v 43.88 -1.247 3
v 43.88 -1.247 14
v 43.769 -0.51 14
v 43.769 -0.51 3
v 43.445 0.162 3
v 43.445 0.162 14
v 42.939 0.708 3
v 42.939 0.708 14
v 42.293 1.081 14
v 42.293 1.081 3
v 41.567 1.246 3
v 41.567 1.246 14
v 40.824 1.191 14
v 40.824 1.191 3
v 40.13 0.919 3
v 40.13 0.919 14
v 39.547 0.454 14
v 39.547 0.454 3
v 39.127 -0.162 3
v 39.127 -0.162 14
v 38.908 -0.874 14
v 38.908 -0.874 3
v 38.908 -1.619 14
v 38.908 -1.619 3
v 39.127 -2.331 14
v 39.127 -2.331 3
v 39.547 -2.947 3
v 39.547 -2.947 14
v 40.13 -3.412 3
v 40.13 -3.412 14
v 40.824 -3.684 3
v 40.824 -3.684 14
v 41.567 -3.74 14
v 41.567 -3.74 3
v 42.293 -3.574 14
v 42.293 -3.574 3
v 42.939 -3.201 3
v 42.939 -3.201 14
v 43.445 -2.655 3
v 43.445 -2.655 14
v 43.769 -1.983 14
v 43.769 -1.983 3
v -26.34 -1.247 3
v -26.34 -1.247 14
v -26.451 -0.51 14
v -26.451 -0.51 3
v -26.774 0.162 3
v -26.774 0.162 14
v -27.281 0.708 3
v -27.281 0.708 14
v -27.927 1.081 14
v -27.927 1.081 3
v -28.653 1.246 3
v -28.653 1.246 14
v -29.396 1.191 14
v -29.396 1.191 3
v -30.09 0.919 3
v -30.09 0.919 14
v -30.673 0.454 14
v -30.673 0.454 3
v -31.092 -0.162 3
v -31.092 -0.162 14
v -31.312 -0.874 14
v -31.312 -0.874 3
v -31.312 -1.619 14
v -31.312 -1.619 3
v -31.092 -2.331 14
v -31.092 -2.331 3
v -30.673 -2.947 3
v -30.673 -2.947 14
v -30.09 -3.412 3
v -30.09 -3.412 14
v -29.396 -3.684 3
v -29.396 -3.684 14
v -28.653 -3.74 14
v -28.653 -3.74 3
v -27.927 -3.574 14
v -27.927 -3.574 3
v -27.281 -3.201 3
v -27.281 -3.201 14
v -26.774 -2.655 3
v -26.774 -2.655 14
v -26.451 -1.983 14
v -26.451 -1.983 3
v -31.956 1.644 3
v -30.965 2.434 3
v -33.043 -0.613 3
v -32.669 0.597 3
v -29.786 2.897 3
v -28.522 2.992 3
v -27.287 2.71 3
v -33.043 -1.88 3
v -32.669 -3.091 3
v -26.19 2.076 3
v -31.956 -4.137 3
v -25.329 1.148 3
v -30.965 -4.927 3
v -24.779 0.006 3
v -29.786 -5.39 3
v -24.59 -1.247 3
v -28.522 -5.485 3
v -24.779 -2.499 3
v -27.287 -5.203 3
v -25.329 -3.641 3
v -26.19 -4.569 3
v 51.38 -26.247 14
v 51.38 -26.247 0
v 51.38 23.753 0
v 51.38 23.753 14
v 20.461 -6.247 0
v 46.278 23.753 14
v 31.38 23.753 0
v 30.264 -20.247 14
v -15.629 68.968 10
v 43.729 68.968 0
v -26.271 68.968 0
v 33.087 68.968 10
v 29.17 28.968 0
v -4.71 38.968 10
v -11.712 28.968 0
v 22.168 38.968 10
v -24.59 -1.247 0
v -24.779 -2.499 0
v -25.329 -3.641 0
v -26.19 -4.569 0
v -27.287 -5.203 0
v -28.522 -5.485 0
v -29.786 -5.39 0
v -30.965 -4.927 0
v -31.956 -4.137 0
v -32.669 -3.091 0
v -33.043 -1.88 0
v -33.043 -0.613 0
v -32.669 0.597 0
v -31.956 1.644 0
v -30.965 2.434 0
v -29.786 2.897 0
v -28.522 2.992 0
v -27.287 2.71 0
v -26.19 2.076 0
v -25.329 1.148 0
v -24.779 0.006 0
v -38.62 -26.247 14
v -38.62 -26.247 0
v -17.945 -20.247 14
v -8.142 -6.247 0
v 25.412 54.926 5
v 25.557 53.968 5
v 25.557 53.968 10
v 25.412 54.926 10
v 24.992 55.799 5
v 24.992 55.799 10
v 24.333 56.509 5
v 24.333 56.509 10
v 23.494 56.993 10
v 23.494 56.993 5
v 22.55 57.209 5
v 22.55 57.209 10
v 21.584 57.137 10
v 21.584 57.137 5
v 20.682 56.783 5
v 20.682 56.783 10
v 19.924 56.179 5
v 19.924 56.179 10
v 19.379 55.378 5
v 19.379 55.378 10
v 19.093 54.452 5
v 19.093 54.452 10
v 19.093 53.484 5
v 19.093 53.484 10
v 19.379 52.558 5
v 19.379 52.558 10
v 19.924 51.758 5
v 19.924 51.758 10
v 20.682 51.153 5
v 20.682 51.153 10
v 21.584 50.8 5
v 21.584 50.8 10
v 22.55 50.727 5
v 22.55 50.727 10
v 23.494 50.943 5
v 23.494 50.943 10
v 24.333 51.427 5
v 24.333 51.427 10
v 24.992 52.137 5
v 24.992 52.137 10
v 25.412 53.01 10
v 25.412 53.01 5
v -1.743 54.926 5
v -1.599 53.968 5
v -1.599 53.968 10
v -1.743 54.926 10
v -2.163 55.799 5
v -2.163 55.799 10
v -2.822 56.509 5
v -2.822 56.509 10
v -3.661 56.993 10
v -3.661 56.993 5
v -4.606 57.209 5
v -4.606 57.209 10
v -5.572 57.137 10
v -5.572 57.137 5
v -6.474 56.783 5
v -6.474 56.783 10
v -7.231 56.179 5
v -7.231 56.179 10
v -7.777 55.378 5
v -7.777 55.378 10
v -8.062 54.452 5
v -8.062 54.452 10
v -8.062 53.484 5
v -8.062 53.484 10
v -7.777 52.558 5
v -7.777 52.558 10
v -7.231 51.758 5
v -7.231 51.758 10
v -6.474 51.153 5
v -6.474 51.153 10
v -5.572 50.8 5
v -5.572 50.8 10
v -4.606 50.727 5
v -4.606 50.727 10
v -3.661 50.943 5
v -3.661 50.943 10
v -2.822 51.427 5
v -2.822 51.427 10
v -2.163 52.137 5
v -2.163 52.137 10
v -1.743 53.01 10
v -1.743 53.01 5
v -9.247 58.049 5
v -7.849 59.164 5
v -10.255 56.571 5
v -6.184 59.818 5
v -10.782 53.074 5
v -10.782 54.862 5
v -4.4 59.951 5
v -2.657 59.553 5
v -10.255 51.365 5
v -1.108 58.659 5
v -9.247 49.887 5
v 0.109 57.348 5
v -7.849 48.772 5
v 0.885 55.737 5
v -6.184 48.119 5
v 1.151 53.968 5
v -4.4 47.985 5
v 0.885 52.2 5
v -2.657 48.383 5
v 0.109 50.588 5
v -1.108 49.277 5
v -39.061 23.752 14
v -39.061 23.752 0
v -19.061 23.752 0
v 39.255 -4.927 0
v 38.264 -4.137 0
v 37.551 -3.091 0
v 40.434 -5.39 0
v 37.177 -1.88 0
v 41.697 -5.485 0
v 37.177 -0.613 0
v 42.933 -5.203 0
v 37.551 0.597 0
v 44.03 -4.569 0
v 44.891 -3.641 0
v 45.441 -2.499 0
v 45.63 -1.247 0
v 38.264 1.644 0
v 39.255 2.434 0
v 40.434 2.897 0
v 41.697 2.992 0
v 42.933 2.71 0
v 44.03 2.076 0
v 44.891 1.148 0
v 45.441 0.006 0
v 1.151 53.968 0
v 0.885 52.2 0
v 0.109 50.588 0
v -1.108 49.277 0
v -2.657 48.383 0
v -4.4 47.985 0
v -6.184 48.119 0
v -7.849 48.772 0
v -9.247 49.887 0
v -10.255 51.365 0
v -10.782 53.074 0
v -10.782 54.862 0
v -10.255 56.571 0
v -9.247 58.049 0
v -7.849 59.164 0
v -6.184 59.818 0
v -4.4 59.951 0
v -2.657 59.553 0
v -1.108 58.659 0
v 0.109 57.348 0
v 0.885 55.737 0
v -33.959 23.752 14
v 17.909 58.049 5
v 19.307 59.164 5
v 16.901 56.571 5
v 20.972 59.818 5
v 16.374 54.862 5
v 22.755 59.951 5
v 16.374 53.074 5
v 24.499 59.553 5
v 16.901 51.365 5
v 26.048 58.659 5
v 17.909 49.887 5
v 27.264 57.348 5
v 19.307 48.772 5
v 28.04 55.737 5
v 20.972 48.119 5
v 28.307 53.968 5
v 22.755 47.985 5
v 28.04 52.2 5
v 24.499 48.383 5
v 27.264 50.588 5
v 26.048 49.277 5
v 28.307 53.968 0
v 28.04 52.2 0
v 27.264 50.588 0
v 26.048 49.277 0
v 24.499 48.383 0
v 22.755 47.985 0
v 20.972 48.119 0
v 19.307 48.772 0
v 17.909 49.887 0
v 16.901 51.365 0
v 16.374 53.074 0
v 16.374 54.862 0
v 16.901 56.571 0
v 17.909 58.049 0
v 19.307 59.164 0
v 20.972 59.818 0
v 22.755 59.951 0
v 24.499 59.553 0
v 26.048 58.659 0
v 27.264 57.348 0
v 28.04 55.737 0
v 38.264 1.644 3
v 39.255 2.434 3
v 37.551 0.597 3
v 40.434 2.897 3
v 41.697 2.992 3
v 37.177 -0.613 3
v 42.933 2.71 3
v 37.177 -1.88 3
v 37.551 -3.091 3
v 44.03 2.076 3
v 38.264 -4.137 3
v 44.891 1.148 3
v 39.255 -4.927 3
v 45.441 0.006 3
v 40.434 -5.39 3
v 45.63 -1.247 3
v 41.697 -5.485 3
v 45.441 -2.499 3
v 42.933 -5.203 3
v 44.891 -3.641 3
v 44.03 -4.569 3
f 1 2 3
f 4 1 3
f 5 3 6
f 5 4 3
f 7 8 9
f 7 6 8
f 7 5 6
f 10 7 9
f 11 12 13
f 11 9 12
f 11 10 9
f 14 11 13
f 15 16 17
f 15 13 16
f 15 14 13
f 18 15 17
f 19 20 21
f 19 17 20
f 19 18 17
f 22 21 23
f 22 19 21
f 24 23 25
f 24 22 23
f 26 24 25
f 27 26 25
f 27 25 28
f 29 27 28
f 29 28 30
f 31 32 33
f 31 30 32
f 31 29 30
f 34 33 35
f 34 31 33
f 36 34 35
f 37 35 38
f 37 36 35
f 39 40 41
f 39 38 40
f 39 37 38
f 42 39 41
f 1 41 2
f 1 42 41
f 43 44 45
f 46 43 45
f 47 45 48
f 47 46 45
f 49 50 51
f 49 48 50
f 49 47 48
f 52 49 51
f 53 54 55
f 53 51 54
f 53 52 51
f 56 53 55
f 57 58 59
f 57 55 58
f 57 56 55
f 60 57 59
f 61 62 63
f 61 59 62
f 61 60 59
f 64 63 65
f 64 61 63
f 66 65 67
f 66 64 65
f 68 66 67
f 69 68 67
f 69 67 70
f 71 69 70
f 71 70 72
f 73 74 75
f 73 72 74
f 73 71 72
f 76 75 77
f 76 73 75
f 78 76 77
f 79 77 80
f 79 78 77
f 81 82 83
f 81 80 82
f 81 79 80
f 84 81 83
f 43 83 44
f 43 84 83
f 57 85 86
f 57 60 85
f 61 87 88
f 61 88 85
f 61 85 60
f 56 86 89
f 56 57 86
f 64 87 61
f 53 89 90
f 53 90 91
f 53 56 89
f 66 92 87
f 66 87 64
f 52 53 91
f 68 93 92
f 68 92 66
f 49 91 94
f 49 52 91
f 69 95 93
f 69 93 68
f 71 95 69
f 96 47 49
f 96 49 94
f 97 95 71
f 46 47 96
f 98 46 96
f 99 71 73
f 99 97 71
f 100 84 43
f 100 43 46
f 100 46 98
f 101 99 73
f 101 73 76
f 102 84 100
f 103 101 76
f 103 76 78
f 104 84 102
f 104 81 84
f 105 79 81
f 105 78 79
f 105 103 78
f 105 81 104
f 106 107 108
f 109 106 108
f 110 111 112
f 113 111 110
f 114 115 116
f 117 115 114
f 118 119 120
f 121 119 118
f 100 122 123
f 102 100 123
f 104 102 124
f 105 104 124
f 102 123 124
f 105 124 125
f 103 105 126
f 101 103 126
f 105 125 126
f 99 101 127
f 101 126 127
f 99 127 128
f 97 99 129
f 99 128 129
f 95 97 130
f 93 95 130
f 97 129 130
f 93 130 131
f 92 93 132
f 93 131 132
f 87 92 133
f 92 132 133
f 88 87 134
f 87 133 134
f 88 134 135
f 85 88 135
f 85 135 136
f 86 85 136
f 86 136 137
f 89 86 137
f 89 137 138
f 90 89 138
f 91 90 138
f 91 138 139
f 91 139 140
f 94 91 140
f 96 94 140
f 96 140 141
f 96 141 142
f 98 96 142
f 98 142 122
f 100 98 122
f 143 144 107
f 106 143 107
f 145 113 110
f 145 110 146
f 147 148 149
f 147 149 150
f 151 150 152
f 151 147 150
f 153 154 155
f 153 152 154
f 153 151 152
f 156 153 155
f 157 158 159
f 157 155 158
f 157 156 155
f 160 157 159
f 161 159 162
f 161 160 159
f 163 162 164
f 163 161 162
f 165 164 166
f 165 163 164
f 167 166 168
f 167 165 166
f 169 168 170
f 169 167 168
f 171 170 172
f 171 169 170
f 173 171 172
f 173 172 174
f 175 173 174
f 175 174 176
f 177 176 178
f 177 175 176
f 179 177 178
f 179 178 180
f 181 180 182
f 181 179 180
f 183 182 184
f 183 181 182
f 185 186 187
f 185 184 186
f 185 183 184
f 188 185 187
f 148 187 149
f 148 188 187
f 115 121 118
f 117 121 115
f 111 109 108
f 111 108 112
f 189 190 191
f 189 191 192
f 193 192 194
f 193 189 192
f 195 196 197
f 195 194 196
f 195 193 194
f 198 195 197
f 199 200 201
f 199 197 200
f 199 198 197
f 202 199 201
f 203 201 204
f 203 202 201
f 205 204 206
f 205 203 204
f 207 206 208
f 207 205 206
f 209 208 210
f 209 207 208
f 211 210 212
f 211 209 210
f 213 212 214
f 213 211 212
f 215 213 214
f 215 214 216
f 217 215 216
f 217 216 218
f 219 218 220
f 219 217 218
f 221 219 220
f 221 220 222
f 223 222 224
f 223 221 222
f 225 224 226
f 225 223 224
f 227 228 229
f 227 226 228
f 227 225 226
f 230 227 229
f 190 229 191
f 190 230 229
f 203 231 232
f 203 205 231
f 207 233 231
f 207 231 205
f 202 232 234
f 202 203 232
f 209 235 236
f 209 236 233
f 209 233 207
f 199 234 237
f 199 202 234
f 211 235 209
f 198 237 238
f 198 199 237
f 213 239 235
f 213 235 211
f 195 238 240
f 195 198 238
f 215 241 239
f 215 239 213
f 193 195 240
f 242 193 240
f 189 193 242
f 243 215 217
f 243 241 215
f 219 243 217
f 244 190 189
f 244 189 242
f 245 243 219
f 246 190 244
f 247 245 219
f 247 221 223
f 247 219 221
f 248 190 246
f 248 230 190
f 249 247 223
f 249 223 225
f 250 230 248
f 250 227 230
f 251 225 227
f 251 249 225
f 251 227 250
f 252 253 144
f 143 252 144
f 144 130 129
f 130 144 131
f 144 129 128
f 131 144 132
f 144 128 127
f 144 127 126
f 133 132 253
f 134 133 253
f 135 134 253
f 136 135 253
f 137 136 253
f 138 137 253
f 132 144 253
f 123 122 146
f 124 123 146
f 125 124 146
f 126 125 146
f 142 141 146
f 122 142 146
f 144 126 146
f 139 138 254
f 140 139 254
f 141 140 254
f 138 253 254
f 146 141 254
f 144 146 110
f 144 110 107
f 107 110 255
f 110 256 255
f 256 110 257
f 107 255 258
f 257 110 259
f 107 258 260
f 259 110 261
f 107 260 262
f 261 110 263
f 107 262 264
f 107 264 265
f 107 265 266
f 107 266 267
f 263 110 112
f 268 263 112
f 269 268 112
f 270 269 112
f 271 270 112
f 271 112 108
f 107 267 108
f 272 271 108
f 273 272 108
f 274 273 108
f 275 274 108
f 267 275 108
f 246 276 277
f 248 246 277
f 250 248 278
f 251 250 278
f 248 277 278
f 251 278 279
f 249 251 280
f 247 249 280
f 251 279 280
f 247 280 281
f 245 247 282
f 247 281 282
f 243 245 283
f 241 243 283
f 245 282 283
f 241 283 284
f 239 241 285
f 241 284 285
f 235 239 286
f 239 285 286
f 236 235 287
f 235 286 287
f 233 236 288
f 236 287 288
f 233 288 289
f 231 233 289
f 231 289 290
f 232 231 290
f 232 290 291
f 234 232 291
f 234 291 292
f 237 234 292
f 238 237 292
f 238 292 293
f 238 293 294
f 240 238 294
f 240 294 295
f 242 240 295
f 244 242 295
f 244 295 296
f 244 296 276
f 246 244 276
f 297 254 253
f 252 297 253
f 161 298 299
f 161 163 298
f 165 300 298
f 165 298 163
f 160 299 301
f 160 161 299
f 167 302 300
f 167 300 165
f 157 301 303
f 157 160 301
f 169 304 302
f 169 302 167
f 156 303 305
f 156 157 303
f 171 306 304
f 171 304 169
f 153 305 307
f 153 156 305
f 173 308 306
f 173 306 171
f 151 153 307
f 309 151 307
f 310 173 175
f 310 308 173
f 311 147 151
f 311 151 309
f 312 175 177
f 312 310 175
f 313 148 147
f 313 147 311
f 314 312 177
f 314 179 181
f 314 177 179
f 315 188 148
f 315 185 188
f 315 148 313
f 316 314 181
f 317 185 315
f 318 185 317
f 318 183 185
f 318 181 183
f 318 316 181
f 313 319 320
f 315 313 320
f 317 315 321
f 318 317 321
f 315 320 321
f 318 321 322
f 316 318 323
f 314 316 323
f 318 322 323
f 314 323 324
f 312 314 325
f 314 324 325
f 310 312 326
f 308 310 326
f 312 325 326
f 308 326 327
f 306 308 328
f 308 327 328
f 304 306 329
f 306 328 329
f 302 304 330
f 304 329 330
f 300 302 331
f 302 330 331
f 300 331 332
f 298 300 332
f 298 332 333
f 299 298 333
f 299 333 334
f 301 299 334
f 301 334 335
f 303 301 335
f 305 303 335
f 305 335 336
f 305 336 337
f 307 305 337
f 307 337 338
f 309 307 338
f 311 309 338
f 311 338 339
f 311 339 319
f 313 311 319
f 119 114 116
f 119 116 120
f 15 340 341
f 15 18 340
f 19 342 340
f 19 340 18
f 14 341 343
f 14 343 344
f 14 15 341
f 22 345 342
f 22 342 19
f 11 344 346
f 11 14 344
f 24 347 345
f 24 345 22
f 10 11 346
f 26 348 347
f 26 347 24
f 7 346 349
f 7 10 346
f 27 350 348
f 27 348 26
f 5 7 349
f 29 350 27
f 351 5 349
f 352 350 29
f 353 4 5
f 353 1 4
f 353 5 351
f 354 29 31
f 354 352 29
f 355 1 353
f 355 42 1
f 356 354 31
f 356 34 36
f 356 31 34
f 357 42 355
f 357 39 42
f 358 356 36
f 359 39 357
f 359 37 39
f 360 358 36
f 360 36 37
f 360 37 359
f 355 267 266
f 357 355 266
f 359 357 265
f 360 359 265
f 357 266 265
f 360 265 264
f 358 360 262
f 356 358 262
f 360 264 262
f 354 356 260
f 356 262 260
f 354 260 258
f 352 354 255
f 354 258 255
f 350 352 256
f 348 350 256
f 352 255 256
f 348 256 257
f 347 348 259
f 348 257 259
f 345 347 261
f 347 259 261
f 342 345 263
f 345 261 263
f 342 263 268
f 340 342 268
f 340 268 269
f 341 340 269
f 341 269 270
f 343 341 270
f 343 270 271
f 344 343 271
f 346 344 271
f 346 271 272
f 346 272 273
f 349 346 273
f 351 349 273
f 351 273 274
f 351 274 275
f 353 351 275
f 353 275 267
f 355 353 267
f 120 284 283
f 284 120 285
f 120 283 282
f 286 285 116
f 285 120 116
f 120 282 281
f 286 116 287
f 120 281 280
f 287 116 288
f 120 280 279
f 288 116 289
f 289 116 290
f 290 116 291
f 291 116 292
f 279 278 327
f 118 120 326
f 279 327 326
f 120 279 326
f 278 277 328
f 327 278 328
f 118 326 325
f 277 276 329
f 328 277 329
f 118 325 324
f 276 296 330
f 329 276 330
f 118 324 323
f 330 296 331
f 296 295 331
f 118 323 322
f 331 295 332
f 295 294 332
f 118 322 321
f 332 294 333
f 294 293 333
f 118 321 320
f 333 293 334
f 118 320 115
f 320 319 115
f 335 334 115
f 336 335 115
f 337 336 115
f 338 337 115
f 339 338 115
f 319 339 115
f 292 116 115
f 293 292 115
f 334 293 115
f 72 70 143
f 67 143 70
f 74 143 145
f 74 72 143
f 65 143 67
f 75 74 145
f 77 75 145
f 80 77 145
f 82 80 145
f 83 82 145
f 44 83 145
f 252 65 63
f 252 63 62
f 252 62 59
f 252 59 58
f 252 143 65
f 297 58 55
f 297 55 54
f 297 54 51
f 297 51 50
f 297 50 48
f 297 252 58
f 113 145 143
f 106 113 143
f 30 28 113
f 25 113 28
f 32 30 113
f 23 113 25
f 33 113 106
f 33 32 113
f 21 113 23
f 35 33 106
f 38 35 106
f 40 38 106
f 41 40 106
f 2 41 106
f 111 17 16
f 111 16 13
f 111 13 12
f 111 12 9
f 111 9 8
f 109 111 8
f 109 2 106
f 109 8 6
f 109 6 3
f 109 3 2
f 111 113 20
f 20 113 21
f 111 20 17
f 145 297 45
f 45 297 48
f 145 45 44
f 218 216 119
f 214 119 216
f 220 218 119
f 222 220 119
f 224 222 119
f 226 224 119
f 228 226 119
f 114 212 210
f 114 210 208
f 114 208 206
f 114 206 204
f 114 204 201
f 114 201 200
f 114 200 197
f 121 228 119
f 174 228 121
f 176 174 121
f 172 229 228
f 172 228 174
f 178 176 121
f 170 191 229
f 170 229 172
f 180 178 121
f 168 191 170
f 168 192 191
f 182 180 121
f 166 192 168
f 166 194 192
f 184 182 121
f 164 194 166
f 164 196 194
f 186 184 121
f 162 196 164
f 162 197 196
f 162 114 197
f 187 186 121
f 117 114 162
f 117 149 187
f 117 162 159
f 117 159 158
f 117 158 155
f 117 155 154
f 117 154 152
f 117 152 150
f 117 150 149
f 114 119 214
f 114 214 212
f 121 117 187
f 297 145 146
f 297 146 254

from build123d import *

# Parameters (mm, degrees)
F0_R           = 2.5
F1_DEPTH       = 14
F2_SIZE        = 13.99999
F3_R           = 3.25
F4_DEPTH       = 10
F5_SIZE        = 9.99999
F6_D           = 6.5
F6_CBORE_D     = 12
F6_CBORE_DEPTH = 5
F7_D           = 6.5
F7_CBORE_D     = 12
F7_CBORE_DEPTH = 5
F8_D           = 5
F8_CBORE_D     = 8.5
F8_CBORE_DEPTH = 3
F9_D           = 5
F9_CBORE_D     = 8.5
F9_CBORE_DEPTH = 3


# Not quite as in the source:
# - a fillet or chamfer is up to 0.001 mm smaller than in the source, because OpenCascade refuses the exact size


with BuildPart() as f1:
    # F0 (on Top) → F1 (new body)
    with BuildSketch(Plane.XY):
        Polygon((-19.0606748313, 23.7515140325), (-39.0606748313, 23.7515140325), (-38.6201621495, -26.2465454156), (51.3798378505, -26.2465454156), (51.3798378505, 23.7534545844), (31.3798378505, 23.7534545844), (20.4607308225, -6.2465454156), (-8.1422741064, -6.2465454156), align=None)
        with Locations((-28.8400389136, -1.2465454156)):
            Circle(F0_R, mode=Mode.SUBTRACT)
        with Locations((41.3798378505, -1.2465454156)):
            Circle(F0_R, mode=Mode.SUBTRACT)
    extrude(amount=F1_DEPTH)

    # F2 (size 14 in the source; OpenCascade refuses exactly that, so slightly less here)
    f2_edges = [f1.edges().sort_by_distance(p)[0] for p in [
        (-13.601474, 8.752484, 14),
        (6.159228, -6.246545, 14),
        (25.920284, 8.753455, 14),
    ]]
    chamfer(f2_edges, length=F2_SIZE)

    # F8 (through all)
    with Locations(Plane(origin=(0, 0, 0), x_dir=(1, 0, 0), z_dir=(0, 0, -1))):
        with Locations((-28.8400389136, 1.2465454156)):
            CounterBoreHole(F8_D / 2, F8_CBORE_D / 2, F8_CBORE_DEPTH)

    # F9 (through all)
    with Locations(Plane(origin=(0, 0, 0), x_dir=(1, 0, 0), z_dir=(0, 0, -1))):
        with Locations((41.3798378505, 1.2465454156)):
            CounterBoreHole(F9_D / 2, F9_CBORE_D / 2, F9_CBORE_DEPTH)


with BuildPart() as f4:
    # F3 (on Top) → F4 (new body)
    with BuildSketch(Plane.XY):
        Polygon((43.7290843949, 68.9680808707), (-26.2709156051, 68.9680808707), (-11.7121062345, 28.9680808707), (29.1702750242, 28.9680808707), align=None)
        with Locations((-4.848695504, 53.9680808707)):
            Circle(F3_R, mode=Mode.SUBTRACT)
        with Locations((22.3068642937, 53.9680808707)):
            Circle(F3_R, mode=Mode.SUBTRACT)
    extrude(amount=F4_DEPTH)

    # F5 (size 10 in the source; OpenCascade refuses exactly that, so slightly less here)
    f5_edges = [f4.edges().sort_by_distance(p)[0] for p in [
        (8.729084, 28.968081, 10),
        (-18.991511, 48.968081, 10),
        (36.44968, 48.968081, 10),
    ]]
    chamfer(f5_edges, length=F5_SIZE)

    # F6 (through all)
    with Locations(Plane(origin=(0, 0, 0), x_dir=(1, 0, 0), z_dir=(0, 0, -1))):
        with Locations((-4.848695504, -53.9680808707)):
            CounterBoreHole(F6_D / 2, F6_CBORE_D / 2, F6_CBORE_DEPTH)

    # F7 (through all)
    with Locations(Plane(origin=(0, 0, 0), x_dir=(1, 0, 0), z_dir=(0, 0, -1))):
        with Locations((22.3068642937, -53.9680808707)):
            CounterBoreHole(F7_D / 2, F7_CBORE_D / 2, F7_CBORE_DEPTH)


solid = Compound([f1.part, f4.part])
